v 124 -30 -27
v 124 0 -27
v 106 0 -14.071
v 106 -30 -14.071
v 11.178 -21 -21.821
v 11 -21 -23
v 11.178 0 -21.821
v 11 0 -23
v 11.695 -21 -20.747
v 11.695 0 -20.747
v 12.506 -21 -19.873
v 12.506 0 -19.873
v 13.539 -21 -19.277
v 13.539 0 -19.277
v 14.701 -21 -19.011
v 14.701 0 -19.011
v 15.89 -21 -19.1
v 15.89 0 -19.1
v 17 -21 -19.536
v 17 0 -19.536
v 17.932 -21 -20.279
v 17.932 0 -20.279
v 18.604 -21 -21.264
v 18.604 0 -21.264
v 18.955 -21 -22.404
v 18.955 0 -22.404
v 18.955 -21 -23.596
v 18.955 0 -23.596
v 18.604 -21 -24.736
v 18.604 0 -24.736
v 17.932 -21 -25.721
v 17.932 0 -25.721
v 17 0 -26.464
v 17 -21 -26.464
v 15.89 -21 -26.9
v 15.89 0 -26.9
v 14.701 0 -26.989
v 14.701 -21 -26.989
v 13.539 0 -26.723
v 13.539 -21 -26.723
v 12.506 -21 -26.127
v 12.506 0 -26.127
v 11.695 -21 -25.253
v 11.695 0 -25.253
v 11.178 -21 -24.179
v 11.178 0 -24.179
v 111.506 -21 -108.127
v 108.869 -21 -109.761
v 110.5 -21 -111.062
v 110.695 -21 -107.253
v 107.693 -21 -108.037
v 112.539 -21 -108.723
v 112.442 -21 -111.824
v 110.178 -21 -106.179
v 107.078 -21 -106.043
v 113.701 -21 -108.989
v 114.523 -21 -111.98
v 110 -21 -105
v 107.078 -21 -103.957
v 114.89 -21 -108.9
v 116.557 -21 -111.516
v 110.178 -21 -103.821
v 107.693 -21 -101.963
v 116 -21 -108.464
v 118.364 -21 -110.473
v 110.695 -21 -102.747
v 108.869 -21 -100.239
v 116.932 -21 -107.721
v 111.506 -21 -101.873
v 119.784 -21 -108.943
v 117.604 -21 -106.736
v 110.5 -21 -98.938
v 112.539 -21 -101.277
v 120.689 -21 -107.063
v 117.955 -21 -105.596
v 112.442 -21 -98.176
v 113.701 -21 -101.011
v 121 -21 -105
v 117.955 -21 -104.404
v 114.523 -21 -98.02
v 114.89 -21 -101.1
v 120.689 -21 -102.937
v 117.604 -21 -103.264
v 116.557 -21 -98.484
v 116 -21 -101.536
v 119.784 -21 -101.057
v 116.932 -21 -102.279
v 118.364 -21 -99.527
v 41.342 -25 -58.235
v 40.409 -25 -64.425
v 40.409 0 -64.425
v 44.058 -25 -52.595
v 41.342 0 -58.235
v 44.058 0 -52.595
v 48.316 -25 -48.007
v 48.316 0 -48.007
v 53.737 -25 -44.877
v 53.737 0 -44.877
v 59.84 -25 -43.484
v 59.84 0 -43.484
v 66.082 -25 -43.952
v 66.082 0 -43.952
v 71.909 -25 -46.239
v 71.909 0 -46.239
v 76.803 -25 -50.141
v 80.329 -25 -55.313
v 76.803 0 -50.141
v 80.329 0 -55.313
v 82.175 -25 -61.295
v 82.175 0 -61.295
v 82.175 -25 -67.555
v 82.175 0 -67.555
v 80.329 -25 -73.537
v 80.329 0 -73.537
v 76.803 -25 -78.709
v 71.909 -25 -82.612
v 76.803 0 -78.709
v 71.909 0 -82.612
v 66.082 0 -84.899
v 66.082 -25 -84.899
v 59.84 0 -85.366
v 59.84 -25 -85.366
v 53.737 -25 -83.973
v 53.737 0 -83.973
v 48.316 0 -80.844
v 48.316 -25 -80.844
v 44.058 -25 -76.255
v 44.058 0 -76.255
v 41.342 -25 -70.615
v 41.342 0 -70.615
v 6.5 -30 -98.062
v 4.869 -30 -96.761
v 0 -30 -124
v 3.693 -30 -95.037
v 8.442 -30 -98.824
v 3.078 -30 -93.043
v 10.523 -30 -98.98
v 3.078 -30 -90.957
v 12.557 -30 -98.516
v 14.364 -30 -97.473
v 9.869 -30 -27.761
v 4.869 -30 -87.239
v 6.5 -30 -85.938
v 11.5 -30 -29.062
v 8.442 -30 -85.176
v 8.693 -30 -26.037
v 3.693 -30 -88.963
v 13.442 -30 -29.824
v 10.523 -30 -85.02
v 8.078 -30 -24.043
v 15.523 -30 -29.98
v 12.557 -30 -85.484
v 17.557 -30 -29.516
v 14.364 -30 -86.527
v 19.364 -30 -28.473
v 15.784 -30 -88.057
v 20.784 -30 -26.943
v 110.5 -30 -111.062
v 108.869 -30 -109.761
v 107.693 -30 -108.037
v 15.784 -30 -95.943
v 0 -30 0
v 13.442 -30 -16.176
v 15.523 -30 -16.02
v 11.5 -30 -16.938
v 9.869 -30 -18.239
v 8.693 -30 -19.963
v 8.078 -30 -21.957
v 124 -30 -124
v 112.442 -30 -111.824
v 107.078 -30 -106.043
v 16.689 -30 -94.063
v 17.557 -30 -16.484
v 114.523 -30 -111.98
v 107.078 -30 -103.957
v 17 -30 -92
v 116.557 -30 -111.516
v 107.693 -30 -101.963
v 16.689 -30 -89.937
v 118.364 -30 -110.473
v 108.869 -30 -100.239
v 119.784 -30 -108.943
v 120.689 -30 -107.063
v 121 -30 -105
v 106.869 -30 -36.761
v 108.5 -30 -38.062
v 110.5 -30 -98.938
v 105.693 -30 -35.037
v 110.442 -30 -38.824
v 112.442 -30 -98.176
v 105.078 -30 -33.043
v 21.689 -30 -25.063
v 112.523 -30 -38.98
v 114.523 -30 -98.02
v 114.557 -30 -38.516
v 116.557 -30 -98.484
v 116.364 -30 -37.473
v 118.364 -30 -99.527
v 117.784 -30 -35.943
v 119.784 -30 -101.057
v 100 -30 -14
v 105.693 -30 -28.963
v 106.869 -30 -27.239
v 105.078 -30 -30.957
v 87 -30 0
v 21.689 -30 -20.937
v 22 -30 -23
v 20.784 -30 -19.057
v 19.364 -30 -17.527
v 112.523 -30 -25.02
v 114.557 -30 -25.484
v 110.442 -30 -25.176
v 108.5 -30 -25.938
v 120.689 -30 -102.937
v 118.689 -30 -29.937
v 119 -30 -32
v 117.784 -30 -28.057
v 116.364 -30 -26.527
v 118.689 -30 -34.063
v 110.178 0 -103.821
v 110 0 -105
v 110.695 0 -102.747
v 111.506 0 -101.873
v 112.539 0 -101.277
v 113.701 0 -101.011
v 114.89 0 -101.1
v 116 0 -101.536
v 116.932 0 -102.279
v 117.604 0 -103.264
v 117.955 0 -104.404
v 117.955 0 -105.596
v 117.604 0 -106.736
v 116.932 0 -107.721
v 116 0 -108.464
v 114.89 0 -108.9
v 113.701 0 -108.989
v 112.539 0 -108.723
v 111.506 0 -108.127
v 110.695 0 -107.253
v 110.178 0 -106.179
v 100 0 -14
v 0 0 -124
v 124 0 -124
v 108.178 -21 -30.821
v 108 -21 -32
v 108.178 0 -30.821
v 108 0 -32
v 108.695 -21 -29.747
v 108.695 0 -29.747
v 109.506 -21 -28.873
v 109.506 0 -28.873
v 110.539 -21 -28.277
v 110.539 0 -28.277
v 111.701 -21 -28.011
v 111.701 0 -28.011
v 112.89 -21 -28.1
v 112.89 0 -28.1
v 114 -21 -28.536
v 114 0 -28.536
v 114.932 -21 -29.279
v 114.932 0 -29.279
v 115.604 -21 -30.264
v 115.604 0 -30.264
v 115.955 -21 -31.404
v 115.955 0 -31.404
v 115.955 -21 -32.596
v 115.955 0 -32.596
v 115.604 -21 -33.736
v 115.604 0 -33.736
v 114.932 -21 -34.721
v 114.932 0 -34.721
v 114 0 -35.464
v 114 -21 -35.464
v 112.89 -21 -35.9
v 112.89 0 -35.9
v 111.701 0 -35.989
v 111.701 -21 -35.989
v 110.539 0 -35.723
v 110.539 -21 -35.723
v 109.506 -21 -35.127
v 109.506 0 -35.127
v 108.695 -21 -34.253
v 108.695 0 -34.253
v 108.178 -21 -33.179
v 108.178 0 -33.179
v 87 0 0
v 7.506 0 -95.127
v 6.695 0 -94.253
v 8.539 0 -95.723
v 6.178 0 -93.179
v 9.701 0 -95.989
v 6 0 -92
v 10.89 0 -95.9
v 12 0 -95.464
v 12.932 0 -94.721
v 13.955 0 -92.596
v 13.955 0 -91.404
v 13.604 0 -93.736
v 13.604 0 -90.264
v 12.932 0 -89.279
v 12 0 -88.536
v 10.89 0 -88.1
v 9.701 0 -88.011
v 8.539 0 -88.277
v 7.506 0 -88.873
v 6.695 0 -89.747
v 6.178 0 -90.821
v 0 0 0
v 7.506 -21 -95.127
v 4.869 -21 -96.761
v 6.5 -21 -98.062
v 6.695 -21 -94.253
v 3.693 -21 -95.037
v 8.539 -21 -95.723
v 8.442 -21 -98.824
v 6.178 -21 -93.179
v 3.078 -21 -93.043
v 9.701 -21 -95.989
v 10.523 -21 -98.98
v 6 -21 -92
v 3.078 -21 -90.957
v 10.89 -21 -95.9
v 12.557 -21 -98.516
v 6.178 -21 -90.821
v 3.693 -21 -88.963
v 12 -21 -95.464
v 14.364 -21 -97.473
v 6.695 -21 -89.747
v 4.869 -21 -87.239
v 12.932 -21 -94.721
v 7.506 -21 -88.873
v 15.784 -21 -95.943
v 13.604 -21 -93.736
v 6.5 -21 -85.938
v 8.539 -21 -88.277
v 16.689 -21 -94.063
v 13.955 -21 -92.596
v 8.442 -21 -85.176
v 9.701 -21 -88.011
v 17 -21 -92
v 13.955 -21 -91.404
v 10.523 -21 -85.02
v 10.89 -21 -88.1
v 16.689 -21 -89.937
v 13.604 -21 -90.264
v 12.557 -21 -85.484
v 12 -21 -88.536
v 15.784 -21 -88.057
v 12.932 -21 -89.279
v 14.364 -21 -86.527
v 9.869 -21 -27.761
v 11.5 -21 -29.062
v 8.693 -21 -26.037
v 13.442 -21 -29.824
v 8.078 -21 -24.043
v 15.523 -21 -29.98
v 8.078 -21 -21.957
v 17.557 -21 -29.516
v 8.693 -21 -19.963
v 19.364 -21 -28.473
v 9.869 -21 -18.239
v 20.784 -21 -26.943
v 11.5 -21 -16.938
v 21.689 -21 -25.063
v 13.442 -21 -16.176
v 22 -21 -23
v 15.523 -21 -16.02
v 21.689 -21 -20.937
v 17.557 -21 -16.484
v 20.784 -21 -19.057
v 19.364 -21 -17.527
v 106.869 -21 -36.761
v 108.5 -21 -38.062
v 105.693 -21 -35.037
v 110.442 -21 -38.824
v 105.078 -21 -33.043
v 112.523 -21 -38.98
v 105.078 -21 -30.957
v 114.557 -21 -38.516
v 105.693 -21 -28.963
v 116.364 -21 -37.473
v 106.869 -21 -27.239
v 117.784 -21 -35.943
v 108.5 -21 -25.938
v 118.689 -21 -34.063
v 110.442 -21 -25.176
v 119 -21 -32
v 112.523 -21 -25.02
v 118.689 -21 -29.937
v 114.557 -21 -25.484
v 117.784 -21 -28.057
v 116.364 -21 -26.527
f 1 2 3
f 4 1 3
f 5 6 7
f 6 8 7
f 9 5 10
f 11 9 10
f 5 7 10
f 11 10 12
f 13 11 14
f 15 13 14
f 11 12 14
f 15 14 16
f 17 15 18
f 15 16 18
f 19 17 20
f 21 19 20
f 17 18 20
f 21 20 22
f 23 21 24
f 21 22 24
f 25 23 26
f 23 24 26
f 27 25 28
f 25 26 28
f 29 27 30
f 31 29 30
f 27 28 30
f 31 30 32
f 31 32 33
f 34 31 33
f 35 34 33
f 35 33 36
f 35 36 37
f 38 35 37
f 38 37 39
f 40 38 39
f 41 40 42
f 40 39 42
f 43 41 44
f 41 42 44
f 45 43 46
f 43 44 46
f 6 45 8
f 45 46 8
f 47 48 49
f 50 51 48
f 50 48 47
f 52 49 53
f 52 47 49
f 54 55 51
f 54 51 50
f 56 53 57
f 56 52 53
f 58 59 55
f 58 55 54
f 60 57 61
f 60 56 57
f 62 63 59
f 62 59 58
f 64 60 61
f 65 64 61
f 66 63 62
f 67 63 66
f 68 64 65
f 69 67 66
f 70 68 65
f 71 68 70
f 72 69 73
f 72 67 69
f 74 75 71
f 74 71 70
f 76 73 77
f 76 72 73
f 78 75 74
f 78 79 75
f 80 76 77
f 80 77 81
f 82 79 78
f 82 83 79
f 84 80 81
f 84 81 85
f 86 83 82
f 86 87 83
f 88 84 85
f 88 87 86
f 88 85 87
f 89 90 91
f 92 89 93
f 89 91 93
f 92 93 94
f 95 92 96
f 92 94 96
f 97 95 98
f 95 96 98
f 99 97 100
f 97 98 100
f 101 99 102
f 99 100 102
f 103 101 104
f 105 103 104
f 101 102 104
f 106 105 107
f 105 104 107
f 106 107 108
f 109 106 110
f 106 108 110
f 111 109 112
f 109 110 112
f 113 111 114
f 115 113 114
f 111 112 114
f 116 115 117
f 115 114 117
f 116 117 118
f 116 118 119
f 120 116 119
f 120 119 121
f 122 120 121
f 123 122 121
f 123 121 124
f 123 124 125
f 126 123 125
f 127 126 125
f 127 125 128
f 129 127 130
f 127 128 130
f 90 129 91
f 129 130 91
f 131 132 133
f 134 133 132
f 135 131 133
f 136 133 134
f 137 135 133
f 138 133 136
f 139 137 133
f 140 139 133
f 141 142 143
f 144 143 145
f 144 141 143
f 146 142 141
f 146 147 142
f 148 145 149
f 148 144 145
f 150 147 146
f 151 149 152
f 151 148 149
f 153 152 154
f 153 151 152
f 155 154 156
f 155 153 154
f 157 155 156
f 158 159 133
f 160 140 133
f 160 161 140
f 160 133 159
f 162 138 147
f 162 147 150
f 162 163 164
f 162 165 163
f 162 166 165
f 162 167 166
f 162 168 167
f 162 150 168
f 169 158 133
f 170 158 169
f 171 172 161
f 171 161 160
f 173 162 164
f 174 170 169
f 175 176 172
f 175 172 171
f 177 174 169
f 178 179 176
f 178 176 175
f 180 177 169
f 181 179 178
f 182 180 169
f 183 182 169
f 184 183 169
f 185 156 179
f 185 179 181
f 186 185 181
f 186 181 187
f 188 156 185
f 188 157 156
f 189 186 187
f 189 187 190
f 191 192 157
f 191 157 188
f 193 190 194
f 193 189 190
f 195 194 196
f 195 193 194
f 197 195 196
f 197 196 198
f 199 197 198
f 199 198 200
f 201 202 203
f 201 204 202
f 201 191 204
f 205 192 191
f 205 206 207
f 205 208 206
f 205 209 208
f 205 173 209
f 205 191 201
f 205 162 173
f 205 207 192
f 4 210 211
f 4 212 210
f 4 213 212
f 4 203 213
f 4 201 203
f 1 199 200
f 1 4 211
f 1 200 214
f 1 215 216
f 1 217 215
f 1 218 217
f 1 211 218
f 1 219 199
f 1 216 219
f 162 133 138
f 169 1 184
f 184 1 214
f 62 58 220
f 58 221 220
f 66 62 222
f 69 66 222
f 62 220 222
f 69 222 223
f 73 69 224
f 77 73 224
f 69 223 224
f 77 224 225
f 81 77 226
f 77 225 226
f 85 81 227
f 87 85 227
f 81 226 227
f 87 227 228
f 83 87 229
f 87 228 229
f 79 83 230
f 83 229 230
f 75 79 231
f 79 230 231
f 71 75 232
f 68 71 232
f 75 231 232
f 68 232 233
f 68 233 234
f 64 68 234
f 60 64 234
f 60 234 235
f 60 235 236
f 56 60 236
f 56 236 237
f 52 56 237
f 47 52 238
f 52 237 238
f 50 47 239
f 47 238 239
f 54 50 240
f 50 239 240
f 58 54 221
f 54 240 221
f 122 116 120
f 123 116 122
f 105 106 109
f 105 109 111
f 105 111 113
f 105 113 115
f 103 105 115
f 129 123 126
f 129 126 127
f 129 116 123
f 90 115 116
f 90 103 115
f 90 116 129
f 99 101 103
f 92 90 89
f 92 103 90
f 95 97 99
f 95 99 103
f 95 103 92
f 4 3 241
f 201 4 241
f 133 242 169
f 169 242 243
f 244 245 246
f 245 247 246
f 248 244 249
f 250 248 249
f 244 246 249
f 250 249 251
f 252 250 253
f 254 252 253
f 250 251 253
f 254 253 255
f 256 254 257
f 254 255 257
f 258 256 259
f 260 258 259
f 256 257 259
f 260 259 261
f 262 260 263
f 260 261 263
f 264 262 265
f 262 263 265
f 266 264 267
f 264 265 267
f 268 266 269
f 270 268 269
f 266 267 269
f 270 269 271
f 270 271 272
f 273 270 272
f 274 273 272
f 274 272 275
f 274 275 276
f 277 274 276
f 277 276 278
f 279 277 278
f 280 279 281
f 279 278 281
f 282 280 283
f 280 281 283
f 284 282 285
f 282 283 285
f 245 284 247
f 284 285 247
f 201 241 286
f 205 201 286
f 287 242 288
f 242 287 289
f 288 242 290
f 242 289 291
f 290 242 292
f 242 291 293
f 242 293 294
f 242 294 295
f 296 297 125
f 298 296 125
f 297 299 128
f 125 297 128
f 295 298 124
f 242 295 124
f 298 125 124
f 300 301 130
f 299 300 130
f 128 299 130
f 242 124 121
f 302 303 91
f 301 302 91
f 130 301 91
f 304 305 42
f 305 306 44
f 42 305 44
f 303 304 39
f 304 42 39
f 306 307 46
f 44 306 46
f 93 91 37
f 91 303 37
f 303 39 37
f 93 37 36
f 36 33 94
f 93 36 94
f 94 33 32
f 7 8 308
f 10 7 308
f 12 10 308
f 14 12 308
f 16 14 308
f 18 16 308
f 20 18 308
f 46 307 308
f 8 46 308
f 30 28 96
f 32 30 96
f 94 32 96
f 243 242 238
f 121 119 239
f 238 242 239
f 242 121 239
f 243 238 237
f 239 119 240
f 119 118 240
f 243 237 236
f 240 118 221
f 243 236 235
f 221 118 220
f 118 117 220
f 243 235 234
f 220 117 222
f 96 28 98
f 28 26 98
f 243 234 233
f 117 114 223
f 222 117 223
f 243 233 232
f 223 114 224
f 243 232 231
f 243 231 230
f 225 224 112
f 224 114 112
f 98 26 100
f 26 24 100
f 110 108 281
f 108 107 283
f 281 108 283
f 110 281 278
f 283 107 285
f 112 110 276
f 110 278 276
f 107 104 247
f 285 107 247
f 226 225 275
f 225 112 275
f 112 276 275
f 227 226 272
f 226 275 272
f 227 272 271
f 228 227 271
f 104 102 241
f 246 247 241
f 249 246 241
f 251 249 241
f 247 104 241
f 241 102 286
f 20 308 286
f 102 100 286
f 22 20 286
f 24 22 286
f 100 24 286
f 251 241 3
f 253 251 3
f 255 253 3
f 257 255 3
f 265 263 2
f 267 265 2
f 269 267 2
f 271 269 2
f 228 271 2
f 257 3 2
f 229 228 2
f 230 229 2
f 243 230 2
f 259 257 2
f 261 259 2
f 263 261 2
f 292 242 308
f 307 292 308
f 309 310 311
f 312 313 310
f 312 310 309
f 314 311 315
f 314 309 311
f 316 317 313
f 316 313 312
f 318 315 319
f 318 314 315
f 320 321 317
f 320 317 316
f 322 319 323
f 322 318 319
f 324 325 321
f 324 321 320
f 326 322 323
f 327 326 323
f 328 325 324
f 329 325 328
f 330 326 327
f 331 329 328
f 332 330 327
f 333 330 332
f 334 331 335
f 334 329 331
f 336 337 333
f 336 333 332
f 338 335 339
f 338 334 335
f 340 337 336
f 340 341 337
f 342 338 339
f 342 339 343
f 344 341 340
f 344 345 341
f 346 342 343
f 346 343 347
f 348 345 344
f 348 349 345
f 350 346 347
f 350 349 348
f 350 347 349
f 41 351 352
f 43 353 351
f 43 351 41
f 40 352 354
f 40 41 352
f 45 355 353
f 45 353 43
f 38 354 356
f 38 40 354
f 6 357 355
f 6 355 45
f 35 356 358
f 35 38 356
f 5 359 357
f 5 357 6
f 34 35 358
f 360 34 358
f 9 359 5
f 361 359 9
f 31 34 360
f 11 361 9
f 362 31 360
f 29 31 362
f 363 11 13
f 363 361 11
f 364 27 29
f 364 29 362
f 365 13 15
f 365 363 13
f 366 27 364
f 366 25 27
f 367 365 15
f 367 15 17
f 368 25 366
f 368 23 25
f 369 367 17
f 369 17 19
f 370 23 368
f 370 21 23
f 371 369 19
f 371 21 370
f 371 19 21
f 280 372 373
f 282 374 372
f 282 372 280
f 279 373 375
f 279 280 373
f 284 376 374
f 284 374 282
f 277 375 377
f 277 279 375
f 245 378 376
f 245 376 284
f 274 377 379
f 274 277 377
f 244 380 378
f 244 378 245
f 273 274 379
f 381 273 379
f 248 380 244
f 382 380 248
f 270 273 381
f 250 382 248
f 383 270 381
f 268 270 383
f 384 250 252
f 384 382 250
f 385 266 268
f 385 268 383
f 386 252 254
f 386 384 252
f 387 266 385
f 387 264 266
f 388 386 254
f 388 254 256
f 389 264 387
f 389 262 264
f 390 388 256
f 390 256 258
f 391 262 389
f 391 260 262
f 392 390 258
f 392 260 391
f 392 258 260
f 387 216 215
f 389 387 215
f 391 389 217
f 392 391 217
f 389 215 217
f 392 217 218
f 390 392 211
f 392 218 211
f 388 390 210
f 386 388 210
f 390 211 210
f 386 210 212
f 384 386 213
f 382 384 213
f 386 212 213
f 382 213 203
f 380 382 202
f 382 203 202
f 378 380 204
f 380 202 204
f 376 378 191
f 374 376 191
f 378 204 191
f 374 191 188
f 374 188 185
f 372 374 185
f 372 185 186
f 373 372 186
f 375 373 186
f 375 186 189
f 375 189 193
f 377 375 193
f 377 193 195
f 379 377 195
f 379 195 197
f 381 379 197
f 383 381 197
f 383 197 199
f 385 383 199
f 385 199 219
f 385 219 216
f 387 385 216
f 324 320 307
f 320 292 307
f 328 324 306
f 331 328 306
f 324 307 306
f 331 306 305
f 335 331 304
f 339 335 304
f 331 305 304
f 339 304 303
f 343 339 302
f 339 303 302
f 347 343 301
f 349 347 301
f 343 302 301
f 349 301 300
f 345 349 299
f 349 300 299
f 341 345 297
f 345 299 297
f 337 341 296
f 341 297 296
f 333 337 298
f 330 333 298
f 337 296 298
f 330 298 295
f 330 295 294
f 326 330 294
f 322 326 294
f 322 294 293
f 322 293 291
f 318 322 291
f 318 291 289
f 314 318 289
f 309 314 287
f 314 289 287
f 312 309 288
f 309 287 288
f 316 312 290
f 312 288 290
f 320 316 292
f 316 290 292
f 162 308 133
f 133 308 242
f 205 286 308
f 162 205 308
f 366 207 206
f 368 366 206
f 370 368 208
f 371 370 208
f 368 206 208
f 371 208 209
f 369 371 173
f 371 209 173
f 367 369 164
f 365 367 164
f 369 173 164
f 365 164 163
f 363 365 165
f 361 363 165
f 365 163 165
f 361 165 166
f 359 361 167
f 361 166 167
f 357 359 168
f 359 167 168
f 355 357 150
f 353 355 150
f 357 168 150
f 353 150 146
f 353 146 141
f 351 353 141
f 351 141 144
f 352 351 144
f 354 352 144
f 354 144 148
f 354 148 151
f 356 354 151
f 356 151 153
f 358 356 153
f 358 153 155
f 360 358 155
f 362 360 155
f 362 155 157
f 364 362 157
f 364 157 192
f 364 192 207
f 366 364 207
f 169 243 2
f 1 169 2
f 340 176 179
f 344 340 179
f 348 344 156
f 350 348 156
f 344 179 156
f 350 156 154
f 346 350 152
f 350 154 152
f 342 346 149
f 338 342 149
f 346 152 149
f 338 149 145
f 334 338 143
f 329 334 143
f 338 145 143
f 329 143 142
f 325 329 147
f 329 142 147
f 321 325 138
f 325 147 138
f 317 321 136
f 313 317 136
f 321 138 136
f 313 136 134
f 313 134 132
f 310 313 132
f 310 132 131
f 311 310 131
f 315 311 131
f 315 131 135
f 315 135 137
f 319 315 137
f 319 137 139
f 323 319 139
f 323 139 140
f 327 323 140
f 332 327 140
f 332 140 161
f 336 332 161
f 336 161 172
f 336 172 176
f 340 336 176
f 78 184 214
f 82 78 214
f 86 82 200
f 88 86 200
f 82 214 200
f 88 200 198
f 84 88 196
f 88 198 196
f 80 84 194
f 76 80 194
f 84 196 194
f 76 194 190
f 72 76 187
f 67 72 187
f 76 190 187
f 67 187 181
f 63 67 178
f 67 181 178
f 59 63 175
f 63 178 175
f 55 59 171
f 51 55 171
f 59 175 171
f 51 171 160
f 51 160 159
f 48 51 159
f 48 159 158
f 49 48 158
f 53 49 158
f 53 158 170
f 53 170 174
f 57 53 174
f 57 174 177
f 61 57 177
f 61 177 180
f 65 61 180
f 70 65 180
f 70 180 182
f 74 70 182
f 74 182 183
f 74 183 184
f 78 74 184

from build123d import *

# Parameters (mm, degrees)
F1_DEPTH       = 30
F3_D           = 8
F3_DEPTH       = 45
F3_CBORE_D     = 14
F3_CBORE_DEPTH = 9
F5_R           = 21
F6_DEPTH       = 25


with BuildPart() as f1:
    # F0 (on Front) → F1 (new body)
    with BuildSketch(Plane.XZ):
        Polygon((87, 0), (0, 0), (0, -124), (124, -124), (124, -27), (106, -14.071459), (100, -14), align=None)
    extrude(amount=F1_DEPTH)

    # F3
    with Locations(Plane.XZ.offset(30)):
        with Locations((15, -23), (10, -92), (112, -32), (114, -105)):
            CounterBoreHole(F3_D / 2, F3_CBORE_D / 2, F3_CBORE_DEPTH, depth=F3_DEPTH)

    # F5 (on face) → F6 (cut)
    with BuildSketch(Plane(origin=(0, 0, 0), x_dir=(-1, 0, 0), z_dir=(0, 1, 0))):
        with Locations((-61.409097, -64.425051)):
            Circle(F5_R)
    extrude(amount=-F6_DEPTH, mode=Mode.SUBTRACT)


solid = f1.part
